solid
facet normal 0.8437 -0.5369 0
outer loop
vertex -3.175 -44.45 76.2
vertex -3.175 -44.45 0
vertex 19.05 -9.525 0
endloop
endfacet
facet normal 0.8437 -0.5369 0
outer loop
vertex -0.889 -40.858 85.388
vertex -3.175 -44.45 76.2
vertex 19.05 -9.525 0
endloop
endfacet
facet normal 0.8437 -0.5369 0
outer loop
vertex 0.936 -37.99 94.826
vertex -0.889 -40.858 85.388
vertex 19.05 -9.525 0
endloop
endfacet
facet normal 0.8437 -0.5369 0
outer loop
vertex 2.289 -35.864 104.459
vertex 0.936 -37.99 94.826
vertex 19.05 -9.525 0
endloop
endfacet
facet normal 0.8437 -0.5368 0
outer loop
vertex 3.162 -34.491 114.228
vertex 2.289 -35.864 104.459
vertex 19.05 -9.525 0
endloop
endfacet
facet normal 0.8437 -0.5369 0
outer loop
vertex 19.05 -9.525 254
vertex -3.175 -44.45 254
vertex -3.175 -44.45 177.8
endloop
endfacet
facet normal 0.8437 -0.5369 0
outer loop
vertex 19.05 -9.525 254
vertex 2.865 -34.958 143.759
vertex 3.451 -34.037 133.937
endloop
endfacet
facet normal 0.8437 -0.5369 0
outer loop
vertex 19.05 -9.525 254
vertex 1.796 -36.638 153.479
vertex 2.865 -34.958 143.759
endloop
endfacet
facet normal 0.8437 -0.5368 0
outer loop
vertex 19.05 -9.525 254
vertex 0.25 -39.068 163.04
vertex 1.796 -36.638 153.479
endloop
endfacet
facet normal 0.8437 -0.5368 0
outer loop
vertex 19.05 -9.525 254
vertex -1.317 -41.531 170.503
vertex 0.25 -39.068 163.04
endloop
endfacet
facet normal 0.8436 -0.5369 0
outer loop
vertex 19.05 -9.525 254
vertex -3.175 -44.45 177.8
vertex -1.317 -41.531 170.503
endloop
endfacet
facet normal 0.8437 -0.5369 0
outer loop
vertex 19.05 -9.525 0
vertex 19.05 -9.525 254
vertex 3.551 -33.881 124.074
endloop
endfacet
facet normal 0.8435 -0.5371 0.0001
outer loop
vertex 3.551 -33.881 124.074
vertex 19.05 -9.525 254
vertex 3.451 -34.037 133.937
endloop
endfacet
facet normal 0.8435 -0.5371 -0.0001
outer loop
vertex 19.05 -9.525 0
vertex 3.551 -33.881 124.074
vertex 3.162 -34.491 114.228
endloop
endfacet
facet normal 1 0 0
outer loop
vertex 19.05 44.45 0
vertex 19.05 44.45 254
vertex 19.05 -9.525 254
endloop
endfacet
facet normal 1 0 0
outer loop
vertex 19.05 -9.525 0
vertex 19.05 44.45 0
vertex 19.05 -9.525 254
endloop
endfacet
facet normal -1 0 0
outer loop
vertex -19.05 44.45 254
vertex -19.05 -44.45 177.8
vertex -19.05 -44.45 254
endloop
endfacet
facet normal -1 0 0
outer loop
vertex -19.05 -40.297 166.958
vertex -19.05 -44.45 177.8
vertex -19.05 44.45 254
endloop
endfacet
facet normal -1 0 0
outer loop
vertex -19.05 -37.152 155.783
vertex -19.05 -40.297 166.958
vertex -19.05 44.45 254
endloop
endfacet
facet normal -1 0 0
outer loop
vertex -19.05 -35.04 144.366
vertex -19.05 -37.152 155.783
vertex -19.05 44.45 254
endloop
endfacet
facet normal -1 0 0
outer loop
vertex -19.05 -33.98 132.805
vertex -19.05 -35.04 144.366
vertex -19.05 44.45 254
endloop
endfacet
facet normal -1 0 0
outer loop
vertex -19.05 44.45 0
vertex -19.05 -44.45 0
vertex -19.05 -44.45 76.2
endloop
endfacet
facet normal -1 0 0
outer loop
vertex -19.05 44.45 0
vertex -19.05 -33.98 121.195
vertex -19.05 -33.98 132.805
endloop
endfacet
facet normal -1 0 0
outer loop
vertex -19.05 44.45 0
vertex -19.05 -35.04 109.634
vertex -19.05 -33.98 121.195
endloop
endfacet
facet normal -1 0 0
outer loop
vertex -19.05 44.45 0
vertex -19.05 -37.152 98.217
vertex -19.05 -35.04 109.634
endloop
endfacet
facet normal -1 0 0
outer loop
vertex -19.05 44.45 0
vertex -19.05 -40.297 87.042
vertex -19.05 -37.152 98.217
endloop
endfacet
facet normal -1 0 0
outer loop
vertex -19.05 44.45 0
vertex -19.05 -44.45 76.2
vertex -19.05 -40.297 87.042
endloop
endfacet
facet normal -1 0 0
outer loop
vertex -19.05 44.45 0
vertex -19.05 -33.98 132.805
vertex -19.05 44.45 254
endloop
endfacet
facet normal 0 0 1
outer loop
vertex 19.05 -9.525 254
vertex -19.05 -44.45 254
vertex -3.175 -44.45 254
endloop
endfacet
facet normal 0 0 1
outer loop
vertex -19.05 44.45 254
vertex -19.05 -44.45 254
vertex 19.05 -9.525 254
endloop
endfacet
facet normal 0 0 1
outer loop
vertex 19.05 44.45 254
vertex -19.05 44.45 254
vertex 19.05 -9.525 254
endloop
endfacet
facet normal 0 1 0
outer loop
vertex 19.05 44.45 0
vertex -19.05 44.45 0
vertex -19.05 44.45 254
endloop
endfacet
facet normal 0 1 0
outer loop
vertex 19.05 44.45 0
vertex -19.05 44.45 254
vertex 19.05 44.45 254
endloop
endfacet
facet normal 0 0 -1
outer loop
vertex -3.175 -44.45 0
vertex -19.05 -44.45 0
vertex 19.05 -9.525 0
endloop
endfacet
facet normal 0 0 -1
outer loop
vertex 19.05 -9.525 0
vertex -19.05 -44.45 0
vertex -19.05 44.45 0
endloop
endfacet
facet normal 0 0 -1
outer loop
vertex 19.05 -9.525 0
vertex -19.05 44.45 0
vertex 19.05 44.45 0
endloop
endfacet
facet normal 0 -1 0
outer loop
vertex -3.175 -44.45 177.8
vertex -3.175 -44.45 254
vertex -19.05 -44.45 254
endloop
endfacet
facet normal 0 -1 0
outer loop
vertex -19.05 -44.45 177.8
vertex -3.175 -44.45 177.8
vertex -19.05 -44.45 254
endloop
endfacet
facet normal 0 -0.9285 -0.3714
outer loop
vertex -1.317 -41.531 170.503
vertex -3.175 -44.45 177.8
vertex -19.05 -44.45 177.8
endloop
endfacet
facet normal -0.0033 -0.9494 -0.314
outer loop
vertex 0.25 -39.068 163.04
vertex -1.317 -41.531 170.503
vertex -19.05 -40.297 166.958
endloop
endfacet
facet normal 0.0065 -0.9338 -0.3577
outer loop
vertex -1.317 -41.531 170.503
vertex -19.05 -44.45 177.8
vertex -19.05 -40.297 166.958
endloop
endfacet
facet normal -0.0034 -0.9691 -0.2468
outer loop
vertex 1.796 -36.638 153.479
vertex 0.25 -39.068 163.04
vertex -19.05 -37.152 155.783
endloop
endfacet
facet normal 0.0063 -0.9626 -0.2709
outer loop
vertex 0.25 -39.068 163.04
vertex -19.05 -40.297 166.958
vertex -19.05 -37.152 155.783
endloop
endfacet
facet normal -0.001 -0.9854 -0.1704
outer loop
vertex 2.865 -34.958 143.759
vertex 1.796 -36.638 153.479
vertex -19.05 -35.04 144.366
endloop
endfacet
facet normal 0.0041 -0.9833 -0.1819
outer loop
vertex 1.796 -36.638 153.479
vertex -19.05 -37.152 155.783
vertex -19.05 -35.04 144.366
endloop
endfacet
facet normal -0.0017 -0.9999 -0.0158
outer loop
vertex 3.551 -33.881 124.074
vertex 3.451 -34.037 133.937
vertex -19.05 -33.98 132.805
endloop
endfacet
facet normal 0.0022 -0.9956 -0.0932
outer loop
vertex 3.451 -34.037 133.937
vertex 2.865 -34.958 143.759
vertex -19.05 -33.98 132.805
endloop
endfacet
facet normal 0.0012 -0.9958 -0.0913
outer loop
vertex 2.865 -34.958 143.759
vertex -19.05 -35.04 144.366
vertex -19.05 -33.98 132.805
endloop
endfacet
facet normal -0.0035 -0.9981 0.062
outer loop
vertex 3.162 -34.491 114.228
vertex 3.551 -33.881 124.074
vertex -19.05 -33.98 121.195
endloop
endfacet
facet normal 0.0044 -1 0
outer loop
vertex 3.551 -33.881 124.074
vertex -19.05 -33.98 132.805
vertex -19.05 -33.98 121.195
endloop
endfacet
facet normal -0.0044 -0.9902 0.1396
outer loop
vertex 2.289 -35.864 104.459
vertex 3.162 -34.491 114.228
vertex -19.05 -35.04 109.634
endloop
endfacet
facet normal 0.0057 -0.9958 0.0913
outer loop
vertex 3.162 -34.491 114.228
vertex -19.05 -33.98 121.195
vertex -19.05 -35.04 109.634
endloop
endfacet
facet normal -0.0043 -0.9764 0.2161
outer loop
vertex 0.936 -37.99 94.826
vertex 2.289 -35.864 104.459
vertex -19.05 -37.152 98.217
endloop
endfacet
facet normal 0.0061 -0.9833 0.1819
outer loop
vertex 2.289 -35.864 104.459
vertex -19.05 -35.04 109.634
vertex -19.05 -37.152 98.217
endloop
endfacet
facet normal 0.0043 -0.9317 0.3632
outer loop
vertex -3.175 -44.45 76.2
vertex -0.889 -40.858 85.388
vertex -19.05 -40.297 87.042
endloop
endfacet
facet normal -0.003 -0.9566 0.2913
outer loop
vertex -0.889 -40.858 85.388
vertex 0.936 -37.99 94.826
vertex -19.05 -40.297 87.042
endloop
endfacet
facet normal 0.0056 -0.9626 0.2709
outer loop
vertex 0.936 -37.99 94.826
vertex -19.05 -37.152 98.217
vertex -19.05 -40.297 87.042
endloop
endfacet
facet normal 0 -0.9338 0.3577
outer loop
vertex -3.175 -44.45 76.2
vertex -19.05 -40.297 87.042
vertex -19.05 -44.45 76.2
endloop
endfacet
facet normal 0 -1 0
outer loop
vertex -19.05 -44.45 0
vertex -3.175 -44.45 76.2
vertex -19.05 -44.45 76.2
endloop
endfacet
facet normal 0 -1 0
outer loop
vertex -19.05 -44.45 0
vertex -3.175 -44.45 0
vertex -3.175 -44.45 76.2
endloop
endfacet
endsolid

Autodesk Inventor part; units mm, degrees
ref_plane "YZ Plane" through (0, 0, 0) normal (1, 0, 0) x (0, 1, 0)
ref_plane "XZ Plane" through (0, 0, 0) normal (0, 1, 0) x (-1, 0, 0)
ref_plane "XY Plane" through (0, 0, 0) normal (0, 0, 1) x (1, 0, 0)
sketch "Sketch1" plane through (0, 0, 0) normal (0, 0, 1) x (1, 0, 0)
  line L0 (19.05, -44.45) -> (-19.05, -44.45)
  line L1 (-19.05, -44.45) -> (-19.05, 44.45)
  line L2 (-19.05, 44.45) -> (19.05, 44.45)
  line L3 (19.05, 44.45) -> (19.05, -44.45)
  line L4 (19.05, -44.45) -> (-19.05, 44.45) construction
  line L5 (-19.05, -44.45) -> (19.05, 44.45) construction
  point P0 (0, 0)
  dimension "d0" = 38.1
  dimension "d1" = 88.9
extrude "Extrusion1" add sketch "Sketch1" along normal blind 254
sketch "Sketch2" plane through (0, 0, 254) normal (0, 0, 1) x (1, 0, 0)
  line L0 (-19.05, -44.45) -> (19.05, -44.45) projected
  line L1 (19.05, -44.45) -> (19.05, 44.45) projected
  line L2 (-3.175, -44.45) -> (19.05, -9.525)
  point P0 (0, 0)
  dimension "d7" = 22.225
  dimension "d8" = 34.925
extrude "Extrusion2" cut sketch "Sketch2" against normal blind 254
sketch "Sketch3" plane through (-19.05, -44.45, 0) normal (-1, 0, 0) x (0, 0, 1)
  line L0 (0, 0) -> (254, 0) projected
  arc A0 (177.8, 0) -> (76.2, 0) centre (127, -116.3974) ccw
  point P0 (0, 44.45)
  dimension "d11" = 76.2
  dimension "d12" = 76.2
  dimension "d13" = 127
extrude "Extrusion3" cut sketch "Sketch3" against normal blind 254
equation "\"d12\" = d11"
properties part number "ShooterFrontMount"
